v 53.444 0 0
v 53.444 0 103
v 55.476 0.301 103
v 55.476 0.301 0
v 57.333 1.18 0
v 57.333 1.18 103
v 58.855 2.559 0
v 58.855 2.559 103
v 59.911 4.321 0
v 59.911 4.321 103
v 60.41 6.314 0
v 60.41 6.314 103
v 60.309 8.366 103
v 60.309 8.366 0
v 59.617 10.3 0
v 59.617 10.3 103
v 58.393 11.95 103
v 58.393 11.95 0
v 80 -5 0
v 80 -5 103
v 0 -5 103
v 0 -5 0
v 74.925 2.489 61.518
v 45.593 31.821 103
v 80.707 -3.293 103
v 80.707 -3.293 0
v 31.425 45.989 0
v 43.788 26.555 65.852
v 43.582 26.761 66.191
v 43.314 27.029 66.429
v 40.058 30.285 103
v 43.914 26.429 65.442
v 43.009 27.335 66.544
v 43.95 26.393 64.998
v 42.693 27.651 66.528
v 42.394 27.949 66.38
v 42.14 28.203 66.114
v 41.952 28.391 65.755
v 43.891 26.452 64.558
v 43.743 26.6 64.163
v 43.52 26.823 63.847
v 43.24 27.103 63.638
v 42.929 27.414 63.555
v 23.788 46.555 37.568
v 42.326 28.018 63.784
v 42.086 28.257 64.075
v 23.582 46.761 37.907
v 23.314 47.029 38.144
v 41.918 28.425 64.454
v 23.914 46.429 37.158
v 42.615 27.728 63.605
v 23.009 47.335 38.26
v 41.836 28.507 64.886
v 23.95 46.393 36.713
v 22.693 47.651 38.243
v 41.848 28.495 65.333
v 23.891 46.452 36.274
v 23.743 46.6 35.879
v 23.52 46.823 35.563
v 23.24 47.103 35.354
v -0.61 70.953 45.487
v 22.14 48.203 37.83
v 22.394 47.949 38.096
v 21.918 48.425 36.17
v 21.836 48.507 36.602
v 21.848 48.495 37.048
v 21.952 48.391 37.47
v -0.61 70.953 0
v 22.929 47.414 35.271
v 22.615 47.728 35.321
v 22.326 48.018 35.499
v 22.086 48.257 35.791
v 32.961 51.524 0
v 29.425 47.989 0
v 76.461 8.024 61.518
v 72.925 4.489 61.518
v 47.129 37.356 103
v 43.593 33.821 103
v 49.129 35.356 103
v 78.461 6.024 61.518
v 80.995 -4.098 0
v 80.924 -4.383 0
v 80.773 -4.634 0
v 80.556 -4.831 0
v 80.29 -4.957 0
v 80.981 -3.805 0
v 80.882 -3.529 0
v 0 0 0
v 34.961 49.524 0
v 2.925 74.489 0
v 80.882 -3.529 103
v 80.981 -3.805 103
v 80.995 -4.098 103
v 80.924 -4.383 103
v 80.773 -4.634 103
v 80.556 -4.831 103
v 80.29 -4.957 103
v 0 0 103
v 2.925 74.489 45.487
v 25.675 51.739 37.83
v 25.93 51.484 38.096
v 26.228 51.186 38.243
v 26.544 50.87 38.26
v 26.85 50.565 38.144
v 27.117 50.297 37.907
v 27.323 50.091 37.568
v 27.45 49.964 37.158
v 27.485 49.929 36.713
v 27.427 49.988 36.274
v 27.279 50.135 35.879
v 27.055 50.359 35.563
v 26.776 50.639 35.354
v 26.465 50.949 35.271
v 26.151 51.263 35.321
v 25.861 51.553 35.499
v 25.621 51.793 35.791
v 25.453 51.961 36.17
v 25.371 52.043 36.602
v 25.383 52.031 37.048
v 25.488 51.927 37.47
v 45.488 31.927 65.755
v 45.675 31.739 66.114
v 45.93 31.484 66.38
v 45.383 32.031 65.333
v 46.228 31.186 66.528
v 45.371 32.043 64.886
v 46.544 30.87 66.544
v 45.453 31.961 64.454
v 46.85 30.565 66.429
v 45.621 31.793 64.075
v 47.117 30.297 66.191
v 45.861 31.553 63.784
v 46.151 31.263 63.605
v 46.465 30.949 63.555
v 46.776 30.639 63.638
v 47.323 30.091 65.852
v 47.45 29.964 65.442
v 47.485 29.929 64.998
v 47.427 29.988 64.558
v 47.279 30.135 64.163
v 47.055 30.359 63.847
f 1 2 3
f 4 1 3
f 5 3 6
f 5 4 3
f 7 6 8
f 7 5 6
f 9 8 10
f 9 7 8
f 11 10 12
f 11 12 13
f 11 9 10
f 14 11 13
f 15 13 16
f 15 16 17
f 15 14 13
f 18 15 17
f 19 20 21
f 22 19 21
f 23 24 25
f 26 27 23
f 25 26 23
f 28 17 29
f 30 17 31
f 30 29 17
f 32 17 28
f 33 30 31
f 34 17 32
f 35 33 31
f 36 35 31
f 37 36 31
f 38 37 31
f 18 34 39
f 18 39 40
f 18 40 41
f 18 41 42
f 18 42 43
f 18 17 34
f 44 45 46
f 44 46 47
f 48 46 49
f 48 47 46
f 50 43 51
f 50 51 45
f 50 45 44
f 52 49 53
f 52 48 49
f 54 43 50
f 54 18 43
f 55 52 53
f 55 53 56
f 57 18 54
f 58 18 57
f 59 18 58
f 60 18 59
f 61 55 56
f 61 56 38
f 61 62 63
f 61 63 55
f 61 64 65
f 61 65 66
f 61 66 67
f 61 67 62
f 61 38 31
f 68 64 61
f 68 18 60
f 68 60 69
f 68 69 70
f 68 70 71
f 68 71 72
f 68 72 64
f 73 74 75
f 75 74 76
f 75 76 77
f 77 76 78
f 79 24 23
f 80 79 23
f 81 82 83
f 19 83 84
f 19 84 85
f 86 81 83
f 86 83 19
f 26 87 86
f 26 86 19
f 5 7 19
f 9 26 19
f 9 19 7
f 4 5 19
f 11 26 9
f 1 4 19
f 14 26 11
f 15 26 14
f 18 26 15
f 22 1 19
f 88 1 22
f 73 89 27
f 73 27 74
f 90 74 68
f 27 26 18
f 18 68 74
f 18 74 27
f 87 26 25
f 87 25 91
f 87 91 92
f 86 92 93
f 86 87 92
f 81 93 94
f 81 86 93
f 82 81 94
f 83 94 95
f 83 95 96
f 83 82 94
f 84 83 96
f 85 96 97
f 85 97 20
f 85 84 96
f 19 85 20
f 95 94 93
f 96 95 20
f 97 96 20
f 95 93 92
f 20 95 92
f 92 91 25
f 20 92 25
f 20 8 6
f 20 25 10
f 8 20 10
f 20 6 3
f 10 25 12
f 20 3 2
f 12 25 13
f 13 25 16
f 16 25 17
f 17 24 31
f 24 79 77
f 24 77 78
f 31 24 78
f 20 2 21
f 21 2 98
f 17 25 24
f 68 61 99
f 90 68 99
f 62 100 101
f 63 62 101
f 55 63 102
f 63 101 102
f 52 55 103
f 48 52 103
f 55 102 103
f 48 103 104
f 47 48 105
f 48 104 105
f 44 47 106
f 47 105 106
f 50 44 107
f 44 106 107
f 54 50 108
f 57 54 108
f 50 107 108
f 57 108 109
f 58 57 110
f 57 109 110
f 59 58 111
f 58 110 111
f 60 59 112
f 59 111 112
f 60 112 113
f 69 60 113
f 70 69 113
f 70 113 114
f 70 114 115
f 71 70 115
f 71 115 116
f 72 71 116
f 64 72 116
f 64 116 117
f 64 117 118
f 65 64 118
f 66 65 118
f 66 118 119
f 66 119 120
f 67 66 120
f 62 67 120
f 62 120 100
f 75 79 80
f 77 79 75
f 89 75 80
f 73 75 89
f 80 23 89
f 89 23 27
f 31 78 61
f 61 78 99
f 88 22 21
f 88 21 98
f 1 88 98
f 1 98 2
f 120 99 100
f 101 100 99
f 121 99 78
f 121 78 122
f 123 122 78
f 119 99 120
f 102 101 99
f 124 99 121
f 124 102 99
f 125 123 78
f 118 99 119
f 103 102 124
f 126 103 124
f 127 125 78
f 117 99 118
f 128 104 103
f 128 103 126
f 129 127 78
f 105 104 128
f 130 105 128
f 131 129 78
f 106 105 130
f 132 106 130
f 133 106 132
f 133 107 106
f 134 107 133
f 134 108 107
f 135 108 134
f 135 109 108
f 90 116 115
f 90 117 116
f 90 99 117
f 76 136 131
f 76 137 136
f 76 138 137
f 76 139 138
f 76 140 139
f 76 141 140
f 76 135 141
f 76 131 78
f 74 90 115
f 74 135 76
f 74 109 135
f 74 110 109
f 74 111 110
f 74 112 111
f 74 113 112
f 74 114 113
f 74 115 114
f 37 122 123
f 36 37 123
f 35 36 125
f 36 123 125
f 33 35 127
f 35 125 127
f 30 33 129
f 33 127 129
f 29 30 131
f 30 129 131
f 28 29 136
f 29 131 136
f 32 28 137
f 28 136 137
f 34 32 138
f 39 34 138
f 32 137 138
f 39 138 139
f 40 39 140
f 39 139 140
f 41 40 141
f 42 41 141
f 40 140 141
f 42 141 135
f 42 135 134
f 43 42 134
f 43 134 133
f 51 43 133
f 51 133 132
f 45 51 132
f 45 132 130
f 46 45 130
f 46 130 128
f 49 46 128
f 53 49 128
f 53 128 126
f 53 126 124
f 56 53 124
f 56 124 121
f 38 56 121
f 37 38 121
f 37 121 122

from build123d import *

# Parameters (mm, degrees)
BOSS_EXTRUDE1_DEPTH       = 103
BOSS_EXTRUDE2_DEPTH       = 5
CUT_EXTRUDE1_DEPTH        = 120.616052434
CUT_EXTRUDE1_DEPTH_BACK   = 5
M5_CLEARANCE_HOLE1_REACH  = 162.532
M5_CLEARANCE_HOLE1_BORE_R = 1.5


with BuildPart() as part:
    # Sketch1 → Boss-Extrude1 (new body)
    with BuildSketch(Plane.XY):
        with BuildLine():
            Line((2.925360851, 74.488852712), (80.707106781, -3.292893219))
            ThreePointArc((80.707106781, -3.292893219), (80.923879533, -4.382683432), (80, -5))
            Line((80, -5), (0, -5))
            Line((0, -5), (0, 0))
            Line((0, 0), (53.443650814, 0))
            ThreePointArc((53.443650814, 0), (59.910807541, 4.321215973), (58.393398282, 11.949747468))
            Line((58.393398282, 11.949747468), (-0.610173055, 70.953318806))
            Line((-0.610173055, 70.953318806), (2.925360851, 74.488852712))
        make_face()
    extrude(amount=BOSS_EXTRUDE1_DEPTH)

    # Sketch2 → Boss-Extrude2 (add)
    with BuildSketch(Plane(origin=(38.707106781, 38.707106781, 0), x_dir=(0, 0, -1), z_dir=(0.7071067811865487, 0.7071067811865465, 0))):
        Polygon((-61.518289963, -48.391918986), (-100.409162928, -9.501046021), (-103, -6.910208949), (-103, -9.738636074), (-61.518289963, -51.220346111), (0, 10.297943853), (0, 13.126370977), (-1.414213562, 11.712157415), align=None)
    extrude(amount=BOSS_EXTRUDE2_DEPTH)

    # Sketch4 → Cut-Extrude1 (cut, two sides)
    with BuildSketch(Plane(origin=(38.707106781, 38.707106781, 0), x_dir=(0, 0, -1), z_dir=(0.7071067811865487, 0.7071067811865465, 0))) as cut_extrude1_sk:
        Polygon((-287.389423781, -191.29963273), (-103, -6.910208949), (-45.486760671, 50.60303038), (138.902663111, 234.992454162), (-229.876184452, 603.771301725), (-656.168271344, 177.479214832), align=None)
    extrude(amount=CUT_EXTRUDE1_DEPTH, mode=Mode.SUBTRACT)
    extrude(cut_extrude1_sk.sketch, amount=-CUT_EXTRUDE1_DEPTH_BACK, mode=Mode.SUBTRACT)

    # M5 Clearance Hole1 bore → M5 Clearance Hole1 (cut, up to next)
    with BuildSketch(Plane(origin=(80.628758112, -3.214544549, 114.598480766), x_dir=(-0.4999999999999967, 0.4999999999999984, 0.707106781186551), z_dir=(0.7071067811865487, 0.7071067811865464, 0)), mode=Mode.PRIVATE) as m5_clearance_hole1_sk1:
        with Locations((-0.829965603, -69.236760125)):
            Circle(M5_CLEARANCE_HOLE1_BORE_R)
    m5_clearance_hole1_tool1 = extrude(m5_clearance_hole1_sk1.sketch, amount=-M5_CLEARANCE_HOLE1_REACH, mode=Mode.PRIVATE) & part.part
    # M5 Clearance Hole1 bore → M5 Clearance Hole1 (cut, up to next)
    with BuildSketch(Plane(origin=(80.628758112, -3.214544549, 114.598480766), x_dir=(-0.4999999999999967, 0.4999999999999984, 0.707106781186551), z_dir=(0.7071067811865487, 0.7071067811865464, 0)), mode=Mode.PRIVATE) as m5_clearance_hole1_sk2:
        with Locations((-0.829965603, -109.236760125)):
            Circle(M5_CLEARANCE_HOLE1_BORE_R)
    m5_clearance_hole1_tool2 = extrude(m5_clearance_hole1_sk2.sketch, amount=-M5_CLEARANCE_HOLE1_REACH, mode=Mode.PRIVATE) & part.part
    add(m5_clearance_hole1_tool1.solids().sort_by_distance((46.425361, 30.988853, 65.053824))[0], mode=Mode.SUBTRACT)
    add(m5_clearance_hole1_tool2.solids().sort_by_distance((26.425361, 50.988853, 36.769553))[0], mode=Mode.SUBTRACT)


solid = part.part
